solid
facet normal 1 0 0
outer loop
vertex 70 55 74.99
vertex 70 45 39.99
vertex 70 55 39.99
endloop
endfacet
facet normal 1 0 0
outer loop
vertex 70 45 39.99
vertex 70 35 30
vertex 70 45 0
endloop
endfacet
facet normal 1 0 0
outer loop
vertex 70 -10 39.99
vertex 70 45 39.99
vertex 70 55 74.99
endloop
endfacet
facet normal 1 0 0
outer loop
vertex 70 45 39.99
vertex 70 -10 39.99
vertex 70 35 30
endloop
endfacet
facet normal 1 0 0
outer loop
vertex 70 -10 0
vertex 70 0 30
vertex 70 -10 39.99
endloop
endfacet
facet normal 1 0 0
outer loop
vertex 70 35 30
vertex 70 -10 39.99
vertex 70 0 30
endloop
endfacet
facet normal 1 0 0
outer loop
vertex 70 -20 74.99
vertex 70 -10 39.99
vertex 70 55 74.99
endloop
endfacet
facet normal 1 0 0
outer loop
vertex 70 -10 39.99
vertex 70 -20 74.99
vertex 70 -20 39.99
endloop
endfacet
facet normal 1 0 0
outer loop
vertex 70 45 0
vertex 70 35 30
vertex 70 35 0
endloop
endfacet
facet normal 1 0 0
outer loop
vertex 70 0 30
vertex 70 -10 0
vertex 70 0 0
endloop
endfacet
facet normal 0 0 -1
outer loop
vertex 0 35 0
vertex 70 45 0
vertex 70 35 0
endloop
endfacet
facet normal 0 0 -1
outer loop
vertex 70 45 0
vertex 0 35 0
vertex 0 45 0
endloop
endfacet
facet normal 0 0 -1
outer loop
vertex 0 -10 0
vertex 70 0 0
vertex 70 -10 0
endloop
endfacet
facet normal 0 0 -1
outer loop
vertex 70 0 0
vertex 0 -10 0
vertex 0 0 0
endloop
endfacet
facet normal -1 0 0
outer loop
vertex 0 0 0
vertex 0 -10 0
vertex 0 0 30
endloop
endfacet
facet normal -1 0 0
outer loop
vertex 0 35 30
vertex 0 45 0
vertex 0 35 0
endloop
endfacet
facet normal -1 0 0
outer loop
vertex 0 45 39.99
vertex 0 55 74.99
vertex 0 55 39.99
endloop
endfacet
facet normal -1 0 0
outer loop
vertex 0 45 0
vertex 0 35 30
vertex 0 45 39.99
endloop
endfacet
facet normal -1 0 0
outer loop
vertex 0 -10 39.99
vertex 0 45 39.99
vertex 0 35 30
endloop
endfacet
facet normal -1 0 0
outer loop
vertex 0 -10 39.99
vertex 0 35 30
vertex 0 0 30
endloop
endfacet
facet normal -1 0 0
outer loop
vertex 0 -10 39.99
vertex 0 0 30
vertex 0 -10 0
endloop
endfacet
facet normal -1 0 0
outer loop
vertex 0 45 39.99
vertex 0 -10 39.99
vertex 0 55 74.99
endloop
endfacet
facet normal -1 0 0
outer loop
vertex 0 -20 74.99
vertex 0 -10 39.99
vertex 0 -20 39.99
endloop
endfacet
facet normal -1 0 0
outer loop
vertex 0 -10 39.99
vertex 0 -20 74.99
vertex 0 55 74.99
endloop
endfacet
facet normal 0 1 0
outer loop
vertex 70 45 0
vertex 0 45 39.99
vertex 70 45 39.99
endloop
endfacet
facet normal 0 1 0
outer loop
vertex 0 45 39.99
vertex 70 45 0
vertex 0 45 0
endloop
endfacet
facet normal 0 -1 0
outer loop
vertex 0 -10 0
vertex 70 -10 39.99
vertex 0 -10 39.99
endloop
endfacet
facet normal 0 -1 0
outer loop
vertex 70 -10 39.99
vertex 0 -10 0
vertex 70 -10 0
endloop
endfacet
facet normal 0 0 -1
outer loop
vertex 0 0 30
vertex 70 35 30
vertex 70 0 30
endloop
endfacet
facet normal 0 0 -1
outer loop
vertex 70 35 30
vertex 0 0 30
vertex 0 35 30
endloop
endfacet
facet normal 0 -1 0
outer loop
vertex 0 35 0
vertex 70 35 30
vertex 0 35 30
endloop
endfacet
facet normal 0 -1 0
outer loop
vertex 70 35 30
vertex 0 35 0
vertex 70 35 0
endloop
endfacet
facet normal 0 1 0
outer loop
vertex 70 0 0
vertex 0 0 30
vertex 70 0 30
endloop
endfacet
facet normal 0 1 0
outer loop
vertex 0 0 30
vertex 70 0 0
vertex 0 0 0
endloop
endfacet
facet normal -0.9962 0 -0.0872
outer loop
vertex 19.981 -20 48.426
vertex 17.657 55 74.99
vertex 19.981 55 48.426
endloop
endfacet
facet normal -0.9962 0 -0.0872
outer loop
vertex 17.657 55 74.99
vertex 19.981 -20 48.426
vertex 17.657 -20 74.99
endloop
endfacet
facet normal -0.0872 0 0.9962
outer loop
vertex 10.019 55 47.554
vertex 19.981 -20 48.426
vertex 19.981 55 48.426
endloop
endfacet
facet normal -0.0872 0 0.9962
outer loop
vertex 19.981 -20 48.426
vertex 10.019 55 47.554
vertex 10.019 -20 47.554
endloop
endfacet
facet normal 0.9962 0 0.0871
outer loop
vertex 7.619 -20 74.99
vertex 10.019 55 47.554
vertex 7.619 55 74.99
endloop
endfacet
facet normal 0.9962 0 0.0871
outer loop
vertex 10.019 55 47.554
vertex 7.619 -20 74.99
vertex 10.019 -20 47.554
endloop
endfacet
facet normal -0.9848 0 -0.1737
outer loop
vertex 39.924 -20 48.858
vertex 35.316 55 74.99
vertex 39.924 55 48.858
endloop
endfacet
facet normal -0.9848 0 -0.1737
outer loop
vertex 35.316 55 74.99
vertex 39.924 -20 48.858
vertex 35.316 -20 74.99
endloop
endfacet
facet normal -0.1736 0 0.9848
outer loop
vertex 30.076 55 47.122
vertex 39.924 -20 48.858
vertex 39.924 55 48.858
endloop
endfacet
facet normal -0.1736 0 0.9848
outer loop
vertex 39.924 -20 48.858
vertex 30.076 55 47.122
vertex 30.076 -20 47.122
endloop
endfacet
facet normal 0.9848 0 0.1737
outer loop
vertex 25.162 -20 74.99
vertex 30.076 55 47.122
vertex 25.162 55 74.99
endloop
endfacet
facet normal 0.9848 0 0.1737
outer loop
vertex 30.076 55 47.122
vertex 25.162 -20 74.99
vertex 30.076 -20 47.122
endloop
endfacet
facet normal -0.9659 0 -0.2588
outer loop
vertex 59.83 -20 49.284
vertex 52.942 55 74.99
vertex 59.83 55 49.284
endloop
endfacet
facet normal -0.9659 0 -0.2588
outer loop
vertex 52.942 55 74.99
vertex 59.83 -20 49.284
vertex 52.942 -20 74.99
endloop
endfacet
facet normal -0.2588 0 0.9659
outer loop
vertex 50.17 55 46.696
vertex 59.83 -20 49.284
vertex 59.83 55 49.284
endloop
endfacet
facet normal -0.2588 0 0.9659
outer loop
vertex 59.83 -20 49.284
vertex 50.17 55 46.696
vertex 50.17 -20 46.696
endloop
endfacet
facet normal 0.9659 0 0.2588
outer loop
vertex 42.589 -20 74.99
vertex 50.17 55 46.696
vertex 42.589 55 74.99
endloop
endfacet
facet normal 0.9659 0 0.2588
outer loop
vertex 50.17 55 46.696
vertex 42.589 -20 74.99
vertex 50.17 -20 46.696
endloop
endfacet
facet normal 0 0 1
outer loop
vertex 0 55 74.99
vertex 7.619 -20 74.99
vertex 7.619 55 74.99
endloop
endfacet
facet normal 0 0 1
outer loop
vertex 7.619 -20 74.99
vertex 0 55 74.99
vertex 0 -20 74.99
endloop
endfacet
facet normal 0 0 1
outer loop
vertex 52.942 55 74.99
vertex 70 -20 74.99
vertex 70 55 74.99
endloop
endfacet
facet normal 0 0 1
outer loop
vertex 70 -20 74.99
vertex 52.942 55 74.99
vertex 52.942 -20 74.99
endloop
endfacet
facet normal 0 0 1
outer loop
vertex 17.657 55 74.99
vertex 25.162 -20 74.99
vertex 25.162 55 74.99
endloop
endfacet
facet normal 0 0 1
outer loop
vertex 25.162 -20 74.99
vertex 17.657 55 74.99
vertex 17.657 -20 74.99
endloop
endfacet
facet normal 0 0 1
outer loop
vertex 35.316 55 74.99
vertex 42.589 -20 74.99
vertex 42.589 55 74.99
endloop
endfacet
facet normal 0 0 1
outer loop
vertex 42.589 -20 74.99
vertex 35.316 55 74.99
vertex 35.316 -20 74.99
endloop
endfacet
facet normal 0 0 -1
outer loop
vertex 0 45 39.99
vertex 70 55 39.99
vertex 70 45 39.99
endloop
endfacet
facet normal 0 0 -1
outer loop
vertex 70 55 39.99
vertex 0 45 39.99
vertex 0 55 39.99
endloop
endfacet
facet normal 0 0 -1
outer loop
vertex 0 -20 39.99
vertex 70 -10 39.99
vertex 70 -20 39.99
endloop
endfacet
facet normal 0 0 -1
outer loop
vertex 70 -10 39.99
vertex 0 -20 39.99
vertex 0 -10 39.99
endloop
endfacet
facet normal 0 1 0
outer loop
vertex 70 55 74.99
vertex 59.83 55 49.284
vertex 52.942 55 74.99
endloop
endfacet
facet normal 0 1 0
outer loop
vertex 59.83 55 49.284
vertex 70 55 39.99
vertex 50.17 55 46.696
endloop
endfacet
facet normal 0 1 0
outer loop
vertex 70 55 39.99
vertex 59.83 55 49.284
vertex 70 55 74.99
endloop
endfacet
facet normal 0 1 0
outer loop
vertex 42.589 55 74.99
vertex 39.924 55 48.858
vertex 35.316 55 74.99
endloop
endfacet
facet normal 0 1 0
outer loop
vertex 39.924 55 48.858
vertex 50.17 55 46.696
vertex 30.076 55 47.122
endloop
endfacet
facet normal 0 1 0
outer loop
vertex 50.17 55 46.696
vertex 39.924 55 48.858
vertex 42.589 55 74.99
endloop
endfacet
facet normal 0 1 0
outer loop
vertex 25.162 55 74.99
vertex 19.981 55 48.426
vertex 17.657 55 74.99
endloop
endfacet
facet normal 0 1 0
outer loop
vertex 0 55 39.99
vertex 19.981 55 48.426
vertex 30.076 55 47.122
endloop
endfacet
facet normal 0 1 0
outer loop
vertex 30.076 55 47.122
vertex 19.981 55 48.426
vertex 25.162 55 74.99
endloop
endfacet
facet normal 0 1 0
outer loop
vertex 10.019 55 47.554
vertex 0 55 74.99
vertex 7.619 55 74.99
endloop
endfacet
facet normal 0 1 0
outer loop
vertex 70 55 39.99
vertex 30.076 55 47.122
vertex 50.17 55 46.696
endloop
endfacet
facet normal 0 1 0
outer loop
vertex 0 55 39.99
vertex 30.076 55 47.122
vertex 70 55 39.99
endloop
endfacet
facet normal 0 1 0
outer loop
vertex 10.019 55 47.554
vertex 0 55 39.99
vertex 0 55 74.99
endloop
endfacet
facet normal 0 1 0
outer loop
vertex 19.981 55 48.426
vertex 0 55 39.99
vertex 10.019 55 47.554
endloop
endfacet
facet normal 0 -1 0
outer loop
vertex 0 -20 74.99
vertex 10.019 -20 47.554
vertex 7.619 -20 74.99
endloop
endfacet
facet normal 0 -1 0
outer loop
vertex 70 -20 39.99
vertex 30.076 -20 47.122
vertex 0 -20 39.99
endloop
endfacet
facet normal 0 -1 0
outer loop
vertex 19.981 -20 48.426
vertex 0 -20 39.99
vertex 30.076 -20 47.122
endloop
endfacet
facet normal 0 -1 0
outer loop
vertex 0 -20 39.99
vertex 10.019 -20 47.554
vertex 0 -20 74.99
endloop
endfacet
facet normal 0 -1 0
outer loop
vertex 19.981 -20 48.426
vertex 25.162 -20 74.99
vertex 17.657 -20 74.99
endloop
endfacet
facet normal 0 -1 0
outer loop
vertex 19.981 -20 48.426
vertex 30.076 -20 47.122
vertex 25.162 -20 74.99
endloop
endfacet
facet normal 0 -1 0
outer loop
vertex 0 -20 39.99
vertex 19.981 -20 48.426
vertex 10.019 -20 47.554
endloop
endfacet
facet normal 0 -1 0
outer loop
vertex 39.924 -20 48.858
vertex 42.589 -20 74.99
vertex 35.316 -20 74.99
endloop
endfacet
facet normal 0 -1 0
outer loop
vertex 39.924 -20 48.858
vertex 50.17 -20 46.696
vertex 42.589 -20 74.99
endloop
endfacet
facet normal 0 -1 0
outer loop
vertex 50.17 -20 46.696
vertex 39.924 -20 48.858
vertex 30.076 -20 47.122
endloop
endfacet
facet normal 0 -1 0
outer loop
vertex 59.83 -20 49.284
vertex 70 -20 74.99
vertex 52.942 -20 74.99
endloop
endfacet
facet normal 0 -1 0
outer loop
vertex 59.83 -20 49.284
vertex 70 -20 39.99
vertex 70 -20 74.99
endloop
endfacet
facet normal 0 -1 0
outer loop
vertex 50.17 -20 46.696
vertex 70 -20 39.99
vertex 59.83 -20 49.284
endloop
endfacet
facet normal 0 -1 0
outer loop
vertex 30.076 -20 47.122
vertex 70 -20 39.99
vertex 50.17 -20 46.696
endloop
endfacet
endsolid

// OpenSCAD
length = 70;
bottomHeight= 40;
topHeight = 35;

dividerWidth = 35;
tabletWidth = 10;

union(){
  color("red")
  difference(){
    translate([0,-10,0])
    cube([length,dividerWidth+20, bottomHeight]);
    translate([-5,0,-1])
    cube([length+10,dividerWidth, bottomHeight-9]);
  }
  translate([0,0,bottomHeight-0.01])
  color("green")
  difference() {
     translate([0,-20,0])
    cube([length,dividerWidth+40, topHeight]);
    translate([-5,-50,8])
    for (a =[1:1:3]) {
      translate([a*20,0,0])
      rotate([0,-a * 5,0])
      translate([-tabletWidth/2,0,0])
      cube([tabletWidth,dividerWidth+100, topHeight]);
    }
  }
}
